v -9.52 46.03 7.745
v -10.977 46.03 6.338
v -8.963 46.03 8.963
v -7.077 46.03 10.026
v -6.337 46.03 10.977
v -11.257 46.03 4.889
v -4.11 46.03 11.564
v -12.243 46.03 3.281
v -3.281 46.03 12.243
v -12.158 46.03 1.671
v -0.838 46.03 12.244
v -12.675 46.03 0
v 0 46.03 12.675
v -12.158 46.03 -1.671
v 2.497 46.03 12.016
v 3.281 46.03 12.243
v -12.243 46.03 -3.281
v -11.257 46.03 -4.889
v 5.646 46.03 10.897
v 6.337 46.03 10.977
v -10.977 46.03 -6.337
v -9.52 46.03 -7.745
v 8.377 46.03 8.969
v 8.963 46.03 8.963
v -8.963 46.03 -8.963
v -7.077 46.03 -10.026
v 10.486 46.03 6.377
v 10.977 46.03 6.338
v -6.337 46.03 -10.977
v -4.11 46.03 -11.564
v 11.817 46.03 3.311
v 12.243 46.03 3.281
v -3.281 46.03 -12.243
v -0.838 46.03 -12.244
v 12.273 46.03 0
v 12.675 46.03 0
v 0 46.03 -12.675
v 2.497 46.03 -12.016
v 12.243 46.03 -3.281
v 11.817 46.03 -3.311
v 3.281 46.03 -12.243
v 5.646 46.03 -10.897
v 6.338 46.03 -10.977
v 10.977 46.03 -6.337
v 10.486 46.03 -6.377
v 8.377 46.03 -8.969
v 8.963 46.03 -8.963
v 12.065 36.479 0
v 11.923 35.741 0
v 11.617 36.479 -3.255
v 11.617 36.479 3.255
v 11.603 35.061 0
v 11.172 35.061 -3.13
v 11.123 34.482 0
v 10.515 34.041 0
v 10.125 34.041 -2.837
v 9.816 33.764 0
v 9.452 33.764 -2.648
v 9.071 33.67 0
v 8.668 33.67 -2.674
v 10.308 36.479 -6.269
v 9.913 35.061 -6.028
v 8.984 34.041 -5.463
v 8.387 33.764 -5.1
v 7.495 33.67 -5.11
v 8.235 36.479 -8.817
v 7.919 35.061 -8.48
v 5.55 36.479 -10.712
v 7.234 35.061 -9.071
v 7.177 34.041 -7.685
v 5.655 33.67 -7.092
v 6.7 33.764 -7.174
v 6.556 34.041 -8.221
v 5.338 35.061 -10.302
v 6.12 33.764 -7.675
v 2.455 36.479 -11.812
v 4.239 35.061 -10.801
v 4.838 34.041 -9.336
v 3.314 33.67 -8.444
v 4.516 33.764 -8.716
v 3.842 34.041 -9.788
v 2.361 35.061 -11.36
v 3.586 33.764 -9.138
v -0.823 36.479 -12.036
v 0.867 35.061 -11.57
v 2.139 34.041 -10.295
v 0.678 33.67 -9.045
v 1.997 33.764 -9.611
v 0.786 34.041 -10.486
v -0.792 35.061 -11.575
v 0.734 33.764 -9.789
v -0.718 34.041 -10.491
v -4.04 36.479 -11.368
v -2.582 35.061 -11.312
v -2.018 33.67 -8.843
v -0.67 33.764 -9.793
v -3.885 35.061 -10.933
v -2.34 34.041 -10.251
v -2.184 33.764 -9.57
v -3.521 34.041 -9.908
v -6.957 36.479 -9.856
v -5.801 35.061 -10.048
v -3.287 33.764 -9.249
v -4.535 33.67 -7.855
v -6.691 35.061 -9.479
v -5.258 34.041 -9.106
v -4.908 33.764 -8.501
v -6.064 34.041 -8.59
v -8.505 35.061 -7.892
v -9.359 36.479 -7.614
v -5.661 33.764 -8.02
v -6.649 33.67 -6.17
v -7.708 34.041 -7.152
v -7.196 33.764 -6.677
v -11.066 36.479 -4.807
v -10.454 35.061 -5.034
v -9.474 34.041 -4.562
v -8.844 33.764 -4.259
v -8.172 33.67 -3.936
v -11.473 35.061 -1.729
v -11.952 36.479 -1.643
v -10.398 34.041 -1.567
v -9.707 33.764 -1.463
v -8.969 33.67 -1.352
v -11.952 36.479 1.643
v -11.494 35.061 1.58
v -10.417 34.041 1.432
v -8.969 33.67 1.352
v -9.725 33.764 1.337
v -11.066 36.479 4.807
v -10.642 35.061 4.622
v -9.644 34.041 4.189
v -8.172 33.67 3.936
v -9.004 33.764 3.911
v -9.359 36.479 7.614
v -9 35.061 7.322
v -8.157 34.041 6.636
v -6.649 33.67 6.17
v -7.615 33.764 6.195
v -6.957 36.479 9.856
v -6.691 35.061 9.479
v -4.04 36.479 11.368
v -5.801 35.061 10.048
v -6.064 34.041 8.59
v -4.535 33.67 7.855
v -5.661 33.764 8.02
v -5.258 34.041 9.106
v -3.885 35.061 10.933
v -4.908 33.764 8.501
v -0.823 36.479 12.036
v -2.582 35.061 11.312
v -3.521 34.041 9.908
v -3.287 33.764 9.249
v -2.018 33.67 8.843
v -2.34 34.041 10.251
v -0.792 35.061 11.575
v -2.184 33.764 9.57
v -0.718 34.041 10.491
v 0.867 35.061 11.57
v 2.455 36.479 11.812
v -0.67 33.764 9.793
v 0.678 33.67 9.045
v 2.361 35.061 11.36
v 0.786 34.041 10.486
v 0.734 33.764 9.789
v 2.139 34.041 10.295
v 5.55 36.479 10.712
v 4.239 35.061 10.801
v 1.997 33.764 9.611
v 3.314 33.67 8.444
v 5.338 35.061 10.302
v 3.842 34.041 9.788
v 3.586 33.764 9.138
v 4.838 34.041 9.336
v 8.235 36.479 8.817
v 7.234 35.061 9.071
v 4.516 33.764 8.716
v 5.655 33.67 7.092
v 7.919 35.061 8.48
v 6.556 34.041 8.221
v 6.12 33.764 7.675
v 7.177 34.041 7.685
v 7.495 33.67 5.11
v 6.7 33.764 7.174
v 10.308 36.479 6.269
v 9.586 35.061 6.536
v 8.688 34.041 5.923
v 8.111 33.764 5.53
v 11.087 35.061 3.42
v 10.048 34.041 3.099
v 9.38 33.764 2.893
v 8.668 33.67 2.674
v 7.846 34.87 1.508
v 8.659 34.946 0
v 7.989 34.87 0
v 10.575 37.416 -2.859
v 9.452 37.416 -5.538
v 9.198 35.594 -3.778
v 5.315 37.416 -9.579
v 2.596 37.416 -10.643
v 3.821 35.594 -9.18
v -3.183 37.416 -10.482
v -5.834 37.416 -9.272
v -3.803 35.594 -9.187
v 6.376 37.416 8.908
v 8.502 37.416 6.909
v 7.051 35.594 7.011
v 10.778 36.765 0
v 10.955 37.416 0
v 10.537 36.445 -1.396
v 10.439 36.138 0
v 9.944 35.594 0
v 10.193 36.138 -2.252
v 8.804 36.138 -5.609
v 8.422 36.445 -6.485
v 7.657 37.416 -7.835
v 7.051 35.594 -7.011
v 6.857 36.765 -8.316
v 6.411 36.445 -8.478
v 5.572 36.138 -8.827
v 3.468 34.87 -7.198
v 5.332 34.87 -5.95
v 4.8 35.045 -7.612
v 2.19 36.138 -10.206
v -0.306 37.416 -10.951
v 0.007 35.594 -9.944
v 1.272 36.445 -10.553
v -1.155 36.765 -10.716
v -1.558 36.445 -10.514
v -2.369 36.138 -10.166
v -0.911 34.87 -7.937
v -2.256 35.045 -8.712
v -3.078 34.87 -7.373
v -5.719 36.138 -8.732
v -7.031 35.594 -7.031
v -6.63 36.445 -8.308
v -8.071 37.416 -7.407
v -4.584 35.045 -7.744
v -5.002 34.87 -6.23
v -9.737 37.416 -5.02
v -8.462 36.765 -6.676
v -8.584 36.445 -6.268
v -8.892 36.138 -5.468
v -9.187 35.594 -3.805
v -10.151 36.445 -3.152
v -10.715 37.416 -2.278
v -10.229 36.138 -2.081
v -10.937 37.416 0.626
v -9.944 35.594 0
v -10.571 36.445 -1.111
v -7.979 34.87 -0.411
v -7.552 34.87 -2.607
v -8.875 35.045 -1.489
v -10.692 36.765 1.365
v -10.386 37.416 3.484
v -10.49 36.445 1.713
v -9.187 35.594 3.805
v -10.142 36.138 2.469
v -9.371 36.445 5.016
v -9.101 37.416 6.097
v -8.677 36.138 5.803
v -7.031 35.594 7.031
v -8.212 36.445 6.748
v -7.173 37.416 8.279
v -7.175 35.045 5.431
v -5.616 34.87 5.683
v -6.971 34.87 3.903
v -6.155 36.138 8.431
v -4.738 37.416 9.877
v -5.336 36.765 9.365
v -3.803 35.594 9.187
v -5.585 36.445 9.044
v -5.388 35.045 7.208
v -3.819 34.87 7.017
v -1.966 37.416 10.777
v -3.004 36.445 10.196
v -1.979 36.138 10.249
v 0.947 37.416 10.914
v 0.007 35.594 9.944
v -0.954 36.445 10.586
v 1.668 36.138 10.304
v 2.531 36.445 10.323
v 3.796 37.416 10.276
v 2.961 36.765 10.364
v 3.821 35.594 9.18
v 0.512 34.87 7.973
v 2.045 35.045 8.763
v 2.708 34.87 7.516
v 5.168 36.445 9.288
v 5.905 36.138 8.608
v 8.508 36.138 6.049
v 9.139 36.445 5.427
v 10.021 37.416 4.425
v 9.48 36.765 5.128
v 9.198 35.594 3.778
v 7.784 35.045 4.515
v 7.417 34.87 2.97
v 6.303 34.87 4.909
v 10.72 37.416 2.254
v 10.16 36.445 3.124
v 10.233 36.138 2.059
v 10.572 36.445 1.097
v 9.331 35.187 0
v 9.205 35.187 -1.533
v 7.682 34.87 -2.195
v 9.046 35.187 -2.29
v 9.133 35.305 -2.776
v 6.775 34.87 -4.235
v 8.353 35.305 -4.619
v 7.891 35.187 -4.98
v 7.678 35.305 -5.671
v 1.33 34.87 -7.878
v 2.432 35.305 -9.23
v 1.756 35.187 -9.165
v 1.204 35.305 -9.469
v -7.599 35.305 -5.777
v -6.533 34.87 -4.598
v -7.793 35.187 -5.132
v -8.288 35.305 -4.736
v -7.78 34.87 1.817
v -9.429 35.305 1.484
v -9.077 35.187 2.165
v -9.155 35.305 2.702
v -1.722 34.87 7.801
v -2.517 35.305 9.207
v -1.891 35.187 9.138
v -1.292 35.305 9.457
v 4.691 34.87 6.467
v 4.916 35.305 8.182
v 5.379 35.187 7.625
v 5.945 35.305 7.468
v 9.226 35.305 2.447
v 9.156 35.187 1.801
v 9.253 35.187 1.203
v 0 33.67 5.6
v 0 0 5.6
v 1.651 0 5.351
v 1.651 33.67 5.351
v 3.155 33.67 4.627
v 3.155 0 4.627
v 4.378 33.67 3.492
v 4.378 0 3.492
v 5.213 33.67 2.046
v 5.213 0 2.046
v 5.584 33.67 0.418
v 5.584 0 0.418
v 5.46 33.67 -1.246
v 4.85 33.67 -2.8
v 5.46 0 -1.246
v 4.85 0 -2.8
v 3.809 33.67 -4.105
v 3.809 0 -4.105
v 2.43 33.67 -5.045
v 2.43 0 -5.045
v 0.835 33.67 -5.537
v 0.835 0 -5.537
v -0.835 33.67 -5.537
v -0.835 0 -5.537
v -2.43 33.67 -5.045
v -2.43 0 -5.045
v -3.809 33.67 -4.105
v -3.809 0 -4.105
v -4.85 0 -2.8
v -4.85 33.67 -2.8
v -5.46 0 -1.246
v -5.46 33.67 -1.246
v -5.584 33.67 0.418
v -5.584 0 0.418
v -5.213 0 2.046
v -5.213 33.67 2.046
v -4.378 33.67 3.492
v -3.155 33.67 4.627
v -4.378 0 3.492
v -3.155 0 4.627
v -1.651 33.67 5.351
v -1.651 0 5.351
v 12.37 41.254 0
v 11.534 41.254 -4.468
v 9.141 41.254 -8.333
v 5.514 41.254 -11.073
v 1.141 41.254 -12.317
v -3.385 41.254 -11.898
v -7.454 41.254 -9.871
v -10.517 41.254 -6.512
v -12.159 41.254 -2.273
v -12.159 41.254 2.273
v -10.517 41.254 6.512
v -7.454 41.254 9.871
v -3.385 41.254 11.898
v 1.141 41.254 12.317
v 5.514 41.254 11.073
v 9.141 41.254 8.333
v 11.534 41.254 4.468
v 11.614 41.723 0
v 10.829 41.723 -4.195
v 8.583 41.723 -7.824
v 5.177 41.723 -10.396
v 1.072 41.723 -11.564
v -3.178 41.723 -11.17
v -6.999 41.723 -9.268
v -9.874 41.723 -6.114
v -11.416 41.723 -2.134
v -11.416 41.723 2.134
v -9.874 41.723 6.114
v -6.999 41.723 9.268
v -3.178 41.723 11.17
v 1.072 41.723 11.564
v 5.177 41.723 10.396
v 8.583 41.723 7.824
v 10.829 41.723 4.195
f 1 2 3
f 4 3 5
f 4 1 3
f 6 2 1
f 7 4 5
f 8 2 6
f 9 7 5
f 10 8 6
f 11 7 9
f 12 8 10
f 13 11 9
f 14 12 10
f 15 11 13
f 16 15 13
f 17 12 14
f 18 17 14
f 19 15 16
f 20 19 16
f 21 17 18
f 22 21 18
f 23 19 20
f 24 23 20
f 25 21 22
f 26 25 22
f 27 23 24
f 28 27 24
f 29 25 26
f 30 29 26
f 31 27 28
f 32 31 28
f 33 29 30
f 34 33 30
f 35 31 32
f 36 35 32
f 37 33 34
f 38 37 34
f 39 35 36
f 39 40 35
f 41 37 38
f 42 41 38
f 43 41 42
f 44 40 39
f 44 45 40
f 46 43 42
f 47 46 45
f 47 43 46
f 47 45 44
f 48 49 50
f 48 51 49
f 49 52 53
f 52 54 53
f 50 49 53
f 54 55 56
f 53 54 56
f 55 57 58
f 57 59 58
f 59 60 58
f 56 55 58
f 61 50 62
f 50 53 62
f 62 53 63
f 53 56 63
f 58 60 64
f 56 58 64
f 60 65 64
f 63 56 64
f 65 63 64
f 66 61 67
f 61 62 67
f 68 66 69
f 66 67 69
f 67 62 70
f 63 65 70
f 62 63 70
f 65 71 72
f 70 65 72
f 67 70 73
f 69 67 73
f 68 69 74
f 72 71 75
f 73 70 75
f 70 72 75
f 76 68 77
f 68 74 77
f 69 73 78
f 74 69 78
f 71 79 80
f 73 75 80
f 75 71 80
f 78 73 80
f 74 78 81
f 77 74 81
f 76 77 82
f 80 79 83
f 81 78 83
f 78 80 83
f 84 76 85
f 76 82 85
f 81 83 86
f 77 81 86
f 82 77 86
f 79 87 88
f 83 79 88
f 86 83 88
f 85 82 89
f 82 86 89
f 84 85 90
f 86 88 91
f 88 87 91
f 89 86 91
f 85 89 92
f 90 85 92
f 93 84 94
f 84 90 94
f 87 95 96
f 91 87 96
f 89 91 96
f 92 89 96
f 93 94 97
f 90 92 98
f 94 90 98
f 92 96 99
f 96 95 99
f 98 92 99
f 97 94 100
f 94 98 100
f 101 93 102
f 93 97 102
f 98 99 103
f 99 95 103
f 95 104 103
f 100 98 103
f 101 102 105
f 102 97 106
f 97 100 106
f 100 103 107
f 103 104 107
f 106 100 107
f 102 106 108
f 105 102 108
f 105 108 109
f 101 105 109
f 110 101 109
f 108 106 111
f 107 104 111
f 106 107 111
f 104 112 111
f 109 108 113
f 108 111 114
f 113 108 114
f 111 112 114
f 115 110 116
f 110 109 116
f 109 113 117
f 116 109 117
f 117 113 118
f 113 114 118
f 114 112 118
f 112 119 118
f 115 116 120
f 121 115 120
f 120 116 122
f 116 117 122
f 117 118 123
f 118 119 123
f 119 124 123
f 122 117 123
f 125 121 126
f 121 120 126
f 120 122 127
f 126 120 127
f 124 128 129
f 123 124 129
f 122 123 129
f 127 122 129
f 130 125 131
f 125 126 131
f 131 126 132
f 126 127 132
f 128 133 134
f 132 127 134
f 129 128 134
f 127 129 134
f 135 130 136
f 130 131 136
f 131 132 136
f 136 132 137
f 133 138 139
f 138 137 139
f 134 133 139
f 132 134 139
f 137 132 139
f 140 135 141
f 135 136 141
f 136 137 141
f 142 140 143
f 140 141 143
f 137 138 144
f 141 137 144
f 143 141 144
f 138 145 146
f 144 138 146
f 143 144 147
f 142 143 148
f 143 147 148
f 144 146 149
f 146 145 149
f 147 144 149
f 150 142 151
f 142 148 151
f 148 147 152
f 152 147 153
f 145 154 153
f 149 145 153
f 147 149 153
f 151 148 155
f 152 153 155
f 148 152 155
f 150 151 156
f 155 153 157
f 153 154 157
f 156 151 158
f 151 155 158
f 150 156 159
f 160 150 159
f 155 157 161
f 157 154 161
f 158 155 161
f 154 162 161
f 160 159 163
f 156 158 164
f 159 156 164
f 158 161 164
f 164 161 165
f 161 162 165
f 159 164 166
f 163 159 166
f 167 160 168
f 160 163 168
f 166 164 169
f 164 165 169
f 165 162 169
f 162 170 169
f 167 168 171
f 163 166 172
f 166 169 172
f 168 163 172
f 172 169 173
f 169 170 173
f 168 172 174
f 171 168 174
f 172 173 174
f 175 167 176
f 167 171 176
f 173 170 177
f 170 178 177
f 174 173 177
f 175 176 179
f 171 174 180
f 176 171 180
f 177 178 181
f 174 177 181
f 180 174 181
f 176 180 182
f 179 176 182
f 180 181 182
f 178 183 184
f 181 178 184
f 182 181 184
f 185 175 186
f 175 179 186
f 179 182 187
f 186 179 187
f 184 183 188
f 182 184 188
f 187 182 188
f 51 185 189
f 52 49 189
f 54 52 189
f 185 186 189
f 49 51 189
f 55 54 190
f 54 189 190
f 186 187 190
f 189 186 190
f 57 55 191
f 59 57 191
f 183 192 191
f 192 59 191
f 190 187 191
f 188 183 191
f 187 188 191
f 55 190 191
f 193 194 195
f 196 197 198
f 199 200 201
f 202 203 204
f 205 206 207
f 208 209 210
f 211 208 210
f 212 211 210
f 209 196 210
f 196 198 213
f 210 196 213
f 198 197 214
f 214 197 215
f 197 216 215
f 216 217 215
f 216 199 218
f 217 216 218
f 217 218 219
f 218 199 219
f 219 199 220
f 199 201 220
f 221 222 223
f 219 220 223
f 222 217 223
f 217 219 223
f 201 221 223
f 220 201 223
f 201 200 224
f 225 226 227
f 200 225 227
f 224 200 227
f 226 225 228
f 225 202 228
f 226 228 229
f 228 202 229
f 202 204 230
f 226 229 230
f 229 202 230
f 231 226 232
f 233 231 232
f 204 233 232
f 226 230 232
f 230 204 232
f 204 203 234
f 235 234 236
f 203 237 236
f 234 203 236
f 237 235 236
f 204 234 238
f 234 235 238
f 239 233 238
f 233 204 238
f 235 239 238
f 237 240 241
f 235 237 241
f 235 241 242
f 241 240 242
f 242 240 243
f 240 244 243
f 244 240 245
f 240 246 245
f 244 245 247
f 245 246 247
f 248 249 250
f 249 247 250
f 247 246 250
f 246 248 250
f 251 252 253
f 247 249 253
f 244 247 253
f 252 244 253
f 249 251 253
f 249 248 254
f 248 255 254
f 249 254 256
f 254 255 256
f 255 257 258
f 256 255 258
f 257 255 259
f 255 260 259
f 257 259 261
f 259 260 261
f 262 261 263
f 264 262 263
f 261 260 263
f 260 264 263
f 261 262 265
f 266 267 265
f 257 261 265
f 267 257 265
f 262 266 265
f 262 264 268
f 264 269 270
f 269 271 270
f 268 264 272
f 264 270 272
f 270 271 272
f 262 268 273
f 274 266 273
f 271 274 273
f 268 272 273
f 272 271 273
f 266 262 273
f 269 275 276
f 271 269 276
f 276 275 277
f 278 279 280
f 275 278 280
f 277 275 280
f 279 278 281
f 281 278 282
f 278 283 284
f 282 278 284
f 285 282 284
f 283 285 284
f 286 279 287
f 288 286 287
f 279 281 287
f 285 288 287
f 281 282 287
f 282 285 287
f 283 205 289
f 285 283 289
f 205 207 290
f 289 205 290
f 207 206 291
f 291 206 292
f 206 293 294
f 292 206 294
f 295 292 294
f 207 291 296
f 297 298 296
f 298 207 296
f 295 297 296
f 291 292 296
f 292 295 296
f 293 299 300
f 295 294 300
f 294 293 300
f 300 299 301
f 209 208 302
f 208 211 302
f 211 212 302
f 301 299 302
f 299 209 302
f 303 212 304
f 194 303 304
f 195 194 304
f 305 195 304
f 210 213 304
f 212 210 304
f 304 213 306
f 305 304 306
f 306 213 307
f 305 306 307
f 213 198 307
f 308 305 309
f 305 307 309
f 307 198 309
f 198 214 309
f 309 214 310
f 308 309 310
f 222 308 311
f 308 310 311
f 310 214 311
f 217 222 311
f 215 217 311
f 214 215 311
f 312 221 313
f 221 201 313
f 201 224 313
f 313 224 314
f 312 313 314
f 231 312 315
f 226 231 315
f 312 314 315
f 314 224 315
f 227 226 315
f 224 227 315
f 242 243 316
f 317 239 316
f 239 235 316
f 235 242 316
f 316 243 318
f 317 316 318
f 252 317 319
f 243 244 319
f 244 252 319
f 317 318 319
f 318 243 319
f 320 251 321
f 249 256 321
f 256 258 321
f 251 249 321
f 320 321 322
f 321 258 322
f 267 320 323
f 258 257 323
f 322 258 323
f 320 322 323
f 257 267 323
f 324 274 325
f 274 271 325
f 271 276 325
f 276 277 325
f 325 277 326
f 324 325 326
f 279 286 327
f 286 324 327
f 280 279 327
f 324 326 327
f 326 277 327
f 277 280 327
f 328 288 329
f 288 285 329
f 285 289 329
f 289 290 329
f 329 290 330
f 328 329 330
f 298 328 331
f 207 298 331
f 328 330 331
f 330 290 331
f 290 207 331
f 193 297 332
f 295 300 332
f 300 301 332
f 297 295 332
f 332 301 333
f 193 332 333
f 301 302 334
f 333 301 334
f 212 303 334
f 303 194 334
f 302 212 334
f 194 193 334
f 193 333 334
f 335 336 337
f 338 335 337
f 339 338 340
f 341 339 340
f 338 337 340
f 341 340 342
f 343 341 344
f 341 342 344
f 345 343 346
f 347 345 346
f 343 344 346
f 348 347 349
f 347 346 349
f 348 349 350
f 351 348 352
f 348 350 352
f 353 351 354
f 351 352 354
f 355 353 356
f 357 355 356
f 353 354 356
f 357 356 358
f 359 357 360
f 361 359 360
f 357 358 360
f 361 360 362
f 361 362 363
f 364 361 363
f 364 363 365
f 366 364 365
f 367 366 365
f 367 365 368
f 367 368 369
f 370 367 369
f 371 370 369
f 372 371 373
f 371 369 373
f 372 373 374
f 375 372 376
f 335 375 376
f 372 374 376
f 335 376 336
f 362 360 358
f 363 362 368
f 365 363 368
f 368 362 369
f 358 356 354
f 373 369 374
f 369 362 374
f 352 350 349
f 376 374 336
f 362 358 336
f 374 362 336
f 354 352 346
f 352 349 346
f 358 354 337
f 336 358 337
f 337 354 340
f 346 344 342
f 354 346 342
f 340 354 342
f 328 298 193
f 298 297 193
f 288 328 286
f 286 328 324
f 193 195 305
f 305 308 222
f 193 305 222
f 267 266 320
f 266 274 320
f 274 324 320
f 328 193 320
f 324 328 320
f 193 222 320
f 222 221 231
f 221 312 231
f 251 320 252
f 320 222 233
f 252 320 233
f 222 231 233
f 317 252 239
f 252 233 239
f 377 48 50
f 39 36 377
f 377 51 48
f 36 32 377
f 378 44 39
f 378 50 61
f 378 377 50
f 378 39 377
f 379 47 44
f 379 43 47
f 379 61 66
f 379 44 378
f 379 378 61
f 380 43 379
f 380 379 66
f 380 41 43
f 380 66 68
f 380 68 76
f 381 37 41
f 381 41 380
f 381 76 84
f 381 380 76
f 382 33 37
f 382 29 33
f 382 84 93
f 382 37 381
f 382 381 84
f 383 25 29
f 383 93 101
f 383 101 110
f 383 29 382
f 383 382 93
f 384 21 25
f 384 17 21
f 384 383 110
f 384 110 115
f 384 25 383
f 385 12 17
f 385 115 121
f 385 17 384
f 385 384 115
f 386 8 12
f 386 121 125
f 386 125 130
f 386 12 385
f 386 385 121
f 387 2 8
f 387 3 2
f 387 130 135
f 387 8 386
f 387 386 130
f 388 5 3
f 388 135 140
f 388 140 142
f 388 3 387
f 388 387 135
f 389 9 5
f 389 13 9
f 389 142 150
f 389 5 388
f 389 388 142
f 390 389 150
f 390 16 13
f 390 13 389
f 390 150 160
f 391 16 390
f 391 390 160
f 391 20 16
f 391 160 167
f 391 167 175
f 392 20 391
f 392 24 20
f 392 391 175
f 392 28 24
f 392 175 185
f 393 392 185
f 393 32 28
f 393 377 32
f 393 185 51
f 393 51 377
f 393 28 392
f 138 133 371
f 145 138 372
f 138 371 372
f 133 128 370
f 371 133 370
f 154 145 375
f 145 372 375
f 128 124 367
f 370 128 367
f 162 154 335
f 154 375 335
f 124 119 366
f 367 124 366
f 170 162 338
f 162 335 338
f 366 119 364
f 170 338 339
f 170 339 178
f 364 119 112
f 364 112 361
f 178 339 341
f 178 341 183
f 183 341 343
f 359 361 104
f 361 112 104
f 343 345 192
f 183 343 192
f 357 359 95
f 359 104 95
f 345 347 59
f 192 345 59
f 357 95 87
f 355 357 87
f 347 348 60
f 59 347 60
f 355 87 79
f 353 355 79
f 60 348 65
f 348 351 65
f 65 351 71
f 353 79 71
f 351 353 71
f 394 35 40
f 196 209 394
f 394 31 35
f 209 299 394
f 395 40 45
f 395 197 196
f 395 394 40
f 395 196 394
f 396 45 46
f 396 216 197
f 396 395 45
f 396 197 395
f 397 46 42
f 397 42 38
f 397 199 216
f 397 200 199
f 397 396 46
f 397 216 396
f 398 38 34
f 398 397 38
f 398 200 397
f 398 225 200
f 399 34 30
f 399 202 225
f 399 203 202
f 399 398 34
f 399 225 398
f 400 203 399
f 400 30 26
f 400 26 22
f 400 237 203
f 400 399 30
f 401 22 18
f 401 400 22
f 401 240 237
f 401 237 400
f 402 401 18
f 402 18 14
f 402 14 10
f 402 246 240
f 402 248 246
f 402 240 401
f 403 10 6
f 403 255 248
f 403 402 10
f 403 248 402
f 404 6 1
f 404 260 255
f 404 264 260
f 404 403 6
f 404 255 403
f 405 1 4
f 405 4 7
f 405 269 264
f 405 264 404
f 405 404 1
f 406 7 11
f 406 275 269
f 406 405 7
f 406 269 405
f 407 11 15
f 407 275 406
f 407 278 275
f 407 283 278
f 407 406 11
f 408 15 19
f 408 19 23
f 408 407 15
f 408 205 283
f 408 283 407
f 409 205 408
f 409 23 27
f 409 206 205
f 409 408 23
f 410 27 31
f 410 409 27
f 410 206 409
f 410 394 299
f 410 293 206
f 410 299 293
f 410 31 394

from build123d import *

# Parameters (mm, degrees)
SKETCH1_R           = 5.6
BOSS_EXTRUDE1_DEPTH = 33.67
SKETCH2_R           = 11.885
SKETCH3_R           = 12.675
FILLET1_R           = 3
CHAMFER1_SIZE       = 0.8
CHAMFER1_SIZE2      = 9
FILLET2_R           = 3


# Read off the part's stored shape, not the designer's step: Shell1
with BuildPart() as part:
    # Sketch1 → Boss-Extrude1 (new body)
    with BuildSketch(Plane(origin=(0, 0, 0), x_dir=(1, 0, 0), z_dir=(0, 1, 0))):
        with Locations(Location((0, 0, 0), (0, 0, 270))):
            Circle(SKETCH1_R)
    extrude(amount=BOSS_EXTRUDE1_DEPTH)

    # Sketch2 → Loft1 section 0
    with BuildSketch(Plane(origin=(0, 33.67, 0), x_dir=(1, 0, 0), z_dir=(0, 1, 0))):
        Circle(SKETCH2_R)
    # Sketch3 → Loft1 section 1
    with BuildSketch(Plane(origin=(0, 46.03, 0), x_dir=(1, 0, 0), z_dir=(0, 1, 0))):
        Circle(SKETCH3_R)
    loft()

    # Shell1 outline → Shell1 (revolve, cut)
    with BuildSketch(Plane.XY):
        Polygon((0, 46.03), (0, 34.87), (10.759250385, 34.87), (11.472551356, 46.03), align=None)
    revolve(axis=Axis((0, 0, 0), (0, 1, 0)), mode=Mode.SUBTRACT)

    # Fillet1
    fillet1_edges = [part.edges().sort_by_distance(p)[0] for p in [
        (-11.885, 33.67, 0),
    ]]
    fillet(fillet1_edges, radius=FILLET1_R)

    # Chamfer1
    chamfer1_edges = [part.edges().sort_by_distance(p)[0] for p in [
        (-11.472551356, 46.03, 0),
    ]]
    chamfer1_side = [part.faces().sort_by_distance(p)[0] for p in [
        (-12.316496862, 46.03, 0),
    ]]
    chamfer(chamfer1_edges, length=CHAMFER1_SIZE, length2=CHAMFER1_SIZE2, reference=chamfer1_side[0])

    # Fillet2
    fillet2_edges = [part.edges().sort_by_distance(p)[0] for p in [
        (-10.759250385, 34.87, 0),
    ]]
    fillet(fillet2_edges, radius=FILLET2_R)


solid = part.part
